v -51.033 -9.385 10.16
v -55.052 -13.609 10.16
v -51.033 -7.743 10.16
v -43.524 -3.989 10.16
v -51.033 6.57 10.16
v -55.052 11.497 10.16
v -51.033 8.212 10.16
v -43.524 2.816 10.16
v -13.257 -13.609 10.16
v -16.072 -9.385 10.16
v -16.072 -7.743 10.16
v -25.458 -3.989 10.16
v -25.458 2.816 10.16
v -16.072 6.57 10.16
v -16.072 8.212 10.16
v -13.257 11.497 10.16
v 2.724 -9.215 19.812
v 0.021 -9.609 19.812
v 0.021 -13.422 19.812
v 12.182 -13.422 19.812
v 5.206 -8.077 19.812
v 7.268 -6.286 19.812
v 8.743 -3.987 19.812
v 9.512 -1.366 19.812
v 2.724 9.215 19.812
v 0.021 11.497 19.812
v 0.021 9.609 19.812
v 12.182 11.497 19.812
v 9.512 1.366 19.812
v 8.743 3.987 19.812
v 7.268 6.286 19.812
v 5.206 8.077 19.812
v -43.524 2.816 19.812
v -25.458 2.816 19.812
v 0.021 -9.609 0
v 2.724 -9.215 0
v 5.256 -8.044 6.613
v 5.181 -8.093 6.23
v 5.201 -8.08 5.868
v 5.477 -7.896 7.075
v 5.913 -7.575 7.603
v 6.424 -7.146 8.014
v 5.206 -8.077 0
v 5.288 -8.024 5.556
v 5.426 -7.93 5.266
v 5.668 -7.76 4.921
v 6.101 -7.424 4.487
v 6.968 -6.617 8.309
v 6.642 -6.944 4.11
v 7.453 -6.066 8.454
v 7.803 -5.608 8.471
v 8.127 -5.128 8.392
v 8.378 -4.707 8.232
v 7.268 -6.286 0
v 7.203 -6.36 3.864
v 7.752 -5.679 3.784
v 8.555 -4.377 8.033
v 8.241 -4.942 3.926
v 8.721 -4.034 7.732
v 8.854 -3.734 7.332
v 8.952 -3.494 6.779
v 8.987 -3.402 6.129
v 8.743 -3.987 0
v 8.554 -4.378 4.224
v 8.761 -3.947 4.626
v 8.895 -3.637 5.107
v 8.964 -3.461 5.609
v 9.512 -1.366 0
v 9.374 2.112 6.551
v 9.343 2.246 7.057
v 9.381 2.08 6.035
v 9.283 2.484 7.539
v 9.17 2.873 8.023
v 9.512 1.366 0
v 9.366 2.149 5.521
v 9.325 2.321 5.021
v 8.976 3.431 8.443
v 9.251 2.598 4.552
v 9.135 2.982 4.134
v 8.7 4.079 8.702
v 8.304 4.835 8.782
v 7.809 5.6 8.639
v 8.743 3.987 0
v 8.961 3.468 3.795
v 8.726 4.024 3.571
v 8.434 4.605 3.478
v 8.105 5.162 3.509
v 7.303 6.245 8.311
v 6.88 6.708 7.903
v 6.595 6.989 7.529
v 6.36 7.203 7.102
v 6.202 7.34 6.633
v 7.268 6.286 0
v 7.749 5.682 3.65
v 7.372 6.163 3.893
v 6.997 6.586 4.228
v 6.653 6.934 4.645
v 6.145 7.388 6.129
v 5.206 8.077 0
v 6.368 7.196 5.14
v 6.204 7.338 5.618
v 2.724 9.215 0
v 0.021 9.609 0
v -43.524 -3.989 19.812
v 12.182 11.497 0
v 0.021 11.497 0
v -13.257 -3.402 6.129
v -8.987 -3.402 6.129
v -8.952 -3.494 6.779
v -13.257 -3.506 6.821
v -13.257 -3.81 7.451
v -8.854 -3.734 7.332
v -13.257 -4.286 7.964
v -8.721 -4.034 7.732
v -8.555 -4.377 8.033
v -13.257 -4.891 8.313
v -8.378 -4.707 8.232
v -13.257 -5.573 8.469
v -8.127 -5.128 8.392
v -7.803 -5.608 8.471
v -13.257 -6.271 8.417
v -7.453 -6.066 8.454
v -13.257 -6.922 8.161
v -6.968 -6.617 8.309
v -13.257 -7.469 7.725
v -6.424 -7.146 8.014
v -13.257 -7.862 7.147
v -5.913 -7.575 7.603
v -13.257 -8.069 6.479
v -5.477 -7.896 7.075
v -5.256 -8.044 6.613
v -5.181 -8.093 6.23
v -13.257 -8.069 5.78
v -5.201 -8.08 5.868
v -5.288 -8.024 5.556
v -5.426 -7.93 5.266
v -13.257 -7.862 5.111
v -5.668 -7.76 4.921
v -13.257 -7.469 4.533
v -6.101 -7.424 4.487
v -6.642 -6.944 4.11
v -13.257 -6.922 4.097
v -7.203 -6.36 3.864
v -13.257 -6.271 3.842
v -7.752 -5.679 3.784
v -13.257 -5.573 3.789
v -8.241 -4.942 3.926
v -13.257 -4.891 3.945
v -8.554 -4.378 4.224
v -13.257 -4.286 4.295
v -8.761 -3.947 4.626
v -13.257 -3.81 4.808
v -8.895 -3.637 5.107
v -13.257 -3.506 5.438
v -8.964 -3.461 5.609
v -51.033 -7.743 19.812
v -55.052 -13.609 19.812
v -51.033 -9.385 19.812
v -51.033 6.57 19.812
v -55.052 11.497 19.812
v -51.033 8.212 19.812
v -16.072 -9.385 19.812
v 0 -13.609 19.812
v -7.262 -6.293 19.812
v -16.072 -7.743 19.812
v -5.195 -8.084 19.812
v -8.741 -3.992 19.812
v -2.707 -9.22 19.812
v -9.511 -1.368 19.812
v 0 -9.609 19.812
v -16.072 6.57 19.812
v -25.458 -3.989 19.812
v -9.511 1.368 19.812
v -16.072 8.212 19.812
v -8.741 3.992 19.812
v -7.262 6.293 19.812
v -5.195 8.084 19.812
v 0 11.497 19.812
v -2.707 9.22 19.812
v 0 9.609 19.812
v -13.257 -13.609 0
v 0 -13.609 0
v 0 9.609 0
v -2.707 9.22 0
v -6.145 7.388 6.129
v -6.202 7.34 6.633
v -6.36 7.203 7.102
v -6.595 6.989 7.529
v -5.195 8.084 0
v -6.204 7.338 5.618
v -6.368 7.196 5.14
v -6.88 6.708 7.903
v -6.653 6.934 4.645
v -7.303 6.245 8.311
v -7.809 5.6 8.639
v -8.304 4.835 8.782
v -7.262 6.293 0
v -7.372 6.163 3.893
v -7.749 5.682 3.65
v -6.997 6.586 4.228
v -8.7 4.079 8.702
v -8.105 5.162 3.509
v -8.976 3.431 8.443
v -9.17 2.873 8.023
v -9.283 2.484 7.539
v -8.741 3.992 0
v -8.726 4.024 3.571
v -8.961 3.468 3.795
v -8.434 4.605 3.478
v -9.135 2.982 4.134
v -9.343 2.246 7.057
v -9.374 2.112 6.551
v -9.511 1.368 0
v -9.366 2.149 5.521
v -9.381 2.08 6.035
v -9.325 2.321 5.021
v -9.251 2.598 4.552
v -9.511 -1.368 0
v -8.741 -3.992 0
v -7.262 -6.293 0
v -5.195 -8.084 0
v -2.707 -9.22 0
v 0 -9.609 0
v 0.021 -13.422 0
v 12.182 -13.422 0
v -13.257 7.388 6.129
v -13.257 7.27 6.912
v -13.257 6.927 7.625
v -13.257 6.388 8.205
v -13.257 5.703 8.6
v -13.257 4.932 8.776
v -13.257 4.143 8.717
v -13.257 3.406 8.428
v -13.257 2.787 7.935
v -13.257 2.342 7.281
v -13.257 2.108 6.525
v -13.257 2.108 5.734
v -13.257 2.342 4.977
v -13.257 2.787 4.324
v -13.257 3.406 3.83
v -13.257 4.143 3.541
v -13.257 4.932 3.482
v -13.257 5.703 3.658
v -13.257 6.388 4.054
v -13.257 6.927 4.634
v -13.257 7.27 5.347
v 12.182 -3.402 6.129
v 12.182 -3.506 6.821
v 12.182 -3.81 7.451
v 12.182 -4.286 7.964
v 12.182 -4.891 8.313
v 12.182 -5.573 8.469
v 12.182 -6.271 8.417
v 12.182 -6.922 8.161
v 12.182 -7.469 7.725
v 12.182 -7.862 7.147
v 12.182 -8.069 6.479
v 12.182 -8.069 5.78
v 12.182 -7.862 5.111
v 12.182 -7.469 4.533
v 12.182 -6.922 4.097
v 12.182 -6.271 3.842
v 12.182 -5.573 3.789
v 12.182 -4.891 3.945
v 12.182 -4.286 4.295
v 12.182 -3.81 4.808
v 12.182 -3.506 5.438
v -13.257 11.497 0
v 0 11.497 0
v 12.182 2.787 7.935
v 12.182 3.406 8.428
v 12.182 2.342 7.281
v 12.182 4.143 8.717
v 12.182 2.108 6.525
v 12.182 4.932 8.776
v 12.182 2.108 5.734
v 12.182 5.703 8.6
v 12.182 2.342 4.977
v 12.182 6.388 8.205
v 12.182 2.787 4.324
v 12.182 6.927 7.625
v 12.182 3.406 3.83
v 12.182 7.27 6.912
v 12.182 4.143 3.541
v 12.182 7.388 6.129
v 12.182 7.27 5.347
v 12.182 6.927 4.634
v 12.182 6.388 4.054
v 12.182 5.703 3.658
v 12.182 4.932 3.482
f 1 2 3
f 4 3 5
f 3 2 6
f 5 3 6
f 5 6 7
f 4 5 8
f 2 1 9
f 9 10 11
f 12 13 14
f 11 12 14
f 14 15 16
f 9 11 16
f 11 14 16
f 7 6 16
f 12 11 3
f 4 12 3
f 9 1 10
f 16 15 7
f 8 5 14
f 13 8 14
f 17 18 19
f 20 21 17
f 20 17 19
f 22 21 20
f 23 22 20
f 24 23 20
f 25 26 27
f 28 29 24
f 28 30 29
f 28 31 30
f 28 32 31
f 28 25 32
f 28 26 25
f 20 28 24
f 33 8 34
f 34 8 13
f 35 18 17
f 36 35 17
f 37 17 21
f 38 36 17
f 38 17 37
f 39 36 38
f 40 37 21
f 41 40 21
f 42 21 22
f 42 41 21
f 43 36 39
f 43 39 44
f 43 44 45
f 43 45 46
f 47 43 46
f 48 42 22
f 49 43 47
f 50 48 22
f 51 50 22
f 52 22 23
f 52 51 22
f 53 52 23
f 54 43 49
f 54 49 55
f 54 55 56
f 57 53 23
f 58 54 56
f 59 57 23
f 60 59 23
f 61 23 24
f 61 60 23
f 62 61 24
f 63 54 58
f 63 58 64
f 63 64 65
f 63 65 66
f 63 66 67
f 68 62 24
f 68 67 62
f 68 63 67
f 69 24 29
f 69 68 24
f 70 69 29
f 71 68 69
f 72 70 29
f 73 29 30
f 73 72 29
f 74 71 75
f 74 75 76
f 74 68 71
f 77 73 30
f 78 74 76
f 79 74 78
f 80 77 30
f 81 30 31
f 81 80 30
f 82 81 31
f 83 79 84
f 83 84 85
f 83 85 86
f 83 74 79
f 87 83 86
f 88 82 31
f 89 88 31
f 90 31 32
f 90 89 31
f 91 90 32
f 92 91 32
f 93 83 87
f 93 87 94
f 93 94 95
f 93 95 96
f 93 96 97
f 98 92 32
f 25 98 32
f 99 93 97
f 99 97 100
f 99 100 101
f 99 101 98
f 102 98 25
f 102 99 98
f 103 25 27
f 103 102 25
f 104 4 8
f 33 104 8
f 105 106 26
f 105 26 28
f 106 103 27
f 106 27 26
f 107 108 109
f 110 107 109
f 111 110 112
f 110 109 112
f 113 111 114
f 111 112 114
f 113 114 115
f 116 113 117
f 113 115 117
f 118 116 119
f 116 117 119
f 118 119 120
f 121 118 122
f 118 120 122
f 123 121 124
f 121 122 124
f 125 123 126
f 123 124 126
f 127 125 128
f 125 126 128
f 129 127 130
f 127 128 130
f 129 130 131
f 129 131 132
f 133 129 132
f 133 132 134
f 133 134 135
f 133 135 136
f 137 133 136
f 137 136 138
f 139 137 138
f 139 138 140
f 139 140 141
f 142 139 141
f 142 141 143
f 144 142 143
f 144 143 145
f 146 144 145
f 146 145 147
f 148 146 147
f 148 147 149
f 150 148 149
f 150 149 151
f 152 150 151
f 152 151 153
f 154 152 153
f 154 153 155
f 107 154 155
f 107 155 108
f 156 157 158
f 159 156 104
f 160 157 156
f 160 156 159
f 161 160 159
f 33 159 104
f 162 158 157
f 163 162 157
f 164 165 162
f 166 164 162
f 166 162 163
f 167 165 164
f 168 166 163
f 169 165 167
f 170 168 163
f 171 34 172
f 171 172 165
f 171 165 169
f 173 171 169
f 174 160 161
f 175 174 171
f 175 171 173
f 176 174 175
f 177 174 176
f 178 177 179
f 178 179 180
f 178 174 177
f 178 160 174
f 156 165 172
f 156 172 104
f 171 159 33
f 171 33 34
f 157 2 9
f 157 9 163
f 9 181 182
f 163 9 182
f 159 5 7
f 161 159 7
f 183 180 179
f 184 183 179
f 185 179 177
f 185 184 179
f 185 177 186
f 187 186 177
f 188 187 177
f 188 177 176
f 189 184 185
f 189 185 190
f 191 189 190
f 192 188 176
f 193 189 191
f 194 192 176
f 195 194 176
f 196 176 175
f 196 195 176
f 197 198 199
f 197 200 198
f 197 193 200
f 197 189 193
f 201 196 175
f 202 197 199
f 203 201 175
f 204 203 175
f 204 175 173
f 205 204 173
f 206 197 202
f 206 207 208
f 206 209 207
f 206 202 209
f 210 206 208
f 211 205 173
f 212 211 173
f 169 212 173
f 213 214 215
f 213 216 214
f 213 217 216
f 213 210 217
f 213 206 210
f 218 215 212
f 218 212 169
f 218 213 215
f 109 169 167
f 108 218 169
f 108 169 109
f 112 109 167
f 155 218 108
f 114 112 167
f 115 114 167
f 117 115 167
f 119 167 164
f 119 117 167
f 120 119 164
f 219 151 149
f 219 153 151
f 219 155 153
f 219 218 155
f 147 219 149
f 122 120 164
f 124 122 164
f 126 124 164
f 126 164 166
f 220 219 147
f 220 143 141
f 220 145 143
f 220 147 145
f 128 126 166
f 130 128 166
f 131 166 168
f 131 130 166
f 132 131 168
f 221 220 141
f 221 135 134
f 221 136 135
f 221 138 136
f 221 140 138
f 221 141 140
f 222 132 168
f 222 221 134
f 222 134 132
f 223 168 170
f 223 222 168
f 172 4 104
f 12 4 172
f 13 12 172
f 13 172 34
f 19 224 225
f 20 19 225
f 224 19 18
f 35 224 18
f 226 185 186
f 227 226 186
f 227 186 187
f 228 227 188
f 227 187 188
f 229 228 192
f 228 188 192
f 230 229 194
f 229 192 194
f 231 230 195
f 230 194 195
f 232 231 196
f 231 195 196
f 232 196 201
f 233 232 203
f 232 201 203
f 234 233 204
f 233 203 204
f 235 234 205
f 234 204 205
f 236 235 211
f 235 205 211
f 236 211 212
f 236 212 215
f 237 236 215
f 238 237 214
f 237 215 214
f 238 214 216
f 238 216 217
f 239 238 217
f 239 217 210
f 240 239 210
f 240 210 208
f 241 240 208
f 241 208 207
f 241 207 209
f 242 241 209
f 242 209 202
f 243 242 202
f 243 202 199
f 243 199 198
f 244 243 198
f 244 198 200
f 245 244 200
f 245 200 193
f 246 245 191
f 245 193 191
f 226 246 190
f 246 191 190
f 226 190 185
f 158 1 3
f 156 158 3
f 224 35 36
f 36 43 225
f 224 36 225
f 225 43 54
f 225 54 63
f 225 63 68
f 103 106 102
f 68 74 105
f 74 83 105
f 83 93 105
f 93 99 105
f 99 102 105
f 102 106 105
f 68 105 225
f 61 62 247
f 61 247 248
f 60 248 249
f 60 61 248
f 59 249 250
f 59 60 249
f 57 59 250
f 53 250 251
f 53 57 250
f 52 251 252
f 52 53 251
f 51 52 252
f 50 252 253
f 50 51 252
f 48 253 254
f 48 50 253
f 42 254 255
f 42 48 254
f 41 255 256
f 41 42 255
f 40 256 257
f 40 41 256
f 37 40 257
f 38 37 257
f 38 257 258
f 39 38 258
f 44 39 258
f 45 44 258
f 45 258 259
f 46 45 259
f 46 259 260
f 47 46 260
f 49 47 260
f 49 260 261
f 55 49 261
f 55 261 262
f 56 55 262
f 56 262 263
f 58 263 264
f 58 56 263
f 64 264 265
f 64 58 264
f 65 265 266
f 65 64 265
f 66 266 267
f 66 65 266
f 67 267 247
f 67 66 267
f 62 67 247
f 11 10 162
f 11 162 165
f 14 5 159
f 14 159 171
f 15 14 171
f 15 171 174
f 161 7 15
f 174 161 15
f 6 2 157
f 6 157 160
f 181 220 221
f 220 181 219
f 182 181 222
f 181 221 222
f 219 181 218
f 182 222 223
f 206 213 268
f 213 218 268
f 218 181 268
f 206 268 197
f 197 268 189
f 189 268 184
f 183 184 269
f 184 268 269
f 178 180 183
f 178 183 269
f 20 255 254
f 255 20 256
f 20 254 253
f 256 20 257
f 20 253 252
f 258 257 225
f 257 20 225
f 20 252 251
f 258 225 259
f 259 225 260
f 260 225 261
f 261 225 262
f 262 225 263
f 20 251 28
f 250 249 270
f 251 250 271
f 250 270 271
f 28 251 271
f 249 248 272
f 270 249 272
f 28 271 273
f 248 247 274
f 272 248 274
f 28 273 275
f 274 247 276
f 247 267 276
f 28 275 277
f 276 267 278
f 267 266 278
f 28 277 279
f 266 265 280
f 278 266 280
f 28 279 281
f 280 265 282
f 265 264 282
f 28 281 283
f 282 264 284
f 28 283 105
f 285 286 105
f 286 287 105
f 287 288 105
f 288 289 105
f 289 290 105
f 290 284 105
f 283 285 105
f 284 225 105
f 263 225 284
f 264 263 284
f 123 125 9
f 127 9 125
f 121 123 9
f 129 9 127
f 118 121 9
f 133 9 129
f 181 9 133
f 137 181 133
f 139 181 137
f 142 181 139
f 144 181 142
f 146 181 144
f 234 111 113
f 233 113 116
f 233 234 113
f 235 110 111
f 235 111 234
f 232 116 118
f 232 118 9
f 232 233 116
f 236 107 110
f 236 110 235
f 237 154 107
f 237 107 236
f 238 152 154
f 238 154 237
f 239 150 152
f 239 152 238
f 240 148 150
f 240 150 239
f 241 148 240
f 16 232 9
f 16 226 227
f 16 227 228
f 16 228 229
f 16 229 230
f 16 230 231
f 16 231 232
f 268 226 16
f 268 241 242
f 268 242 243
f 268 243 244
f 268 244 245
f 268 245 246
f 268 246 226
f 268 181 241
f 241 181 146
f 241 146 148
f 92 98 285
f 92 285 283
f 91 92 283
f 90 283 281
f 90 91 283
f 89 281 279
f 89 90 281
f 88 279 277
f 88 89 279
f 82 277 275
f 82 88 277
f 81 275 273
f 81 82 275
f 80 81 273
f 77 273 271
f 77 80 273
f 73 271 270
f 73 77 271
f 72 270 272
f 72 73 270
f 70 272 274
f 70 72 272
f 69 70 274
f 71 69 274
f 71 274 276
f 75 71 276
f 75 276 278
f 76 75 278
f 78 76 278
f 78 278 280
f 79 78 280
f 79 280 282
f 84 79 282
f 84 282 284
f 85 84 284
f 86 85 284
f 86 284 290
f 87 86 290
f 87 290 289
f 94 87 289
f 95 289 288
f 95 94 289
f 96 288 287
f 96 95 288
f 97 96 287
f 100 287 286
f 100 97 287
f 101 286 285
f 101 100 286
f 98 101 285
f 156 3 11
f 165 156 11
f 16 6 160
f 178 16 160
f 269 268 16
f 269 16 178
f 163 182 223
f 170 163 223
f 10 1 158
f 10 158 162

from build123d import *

# Parameters (mm, degrees)
F0_W      = 55.052046
F0_H      = 25.105778
F0_W_2    = 12.161485
F0_H_2    = 24.918798
F1_DEPTH  = 19.812
F2_R      = 9.609235
F3_DEPTH  = 37.338
F4_W      = 50.915458
F4_H      = 32.379413
F5_DEPTH  = 10.16
F6_R      = 2.654575
F6_R_2    = 2.346336
F7_DEPTH  = 25.4
F8_DEPTH  = 29.21
F9_W      = 34.960383
F9_H      = 1.642434
F9_H_2    = 1.642435
F9_W_2    = 18.066769
F9_H_3    = 6.804369
F10_DEPTH = 47.498


with BuildPart() as f1:
    # F0 (on Top) → F1 (new body)
    with BuildSketch(Plane.XY):
        with Locations((-27.526023, -1.055851)):
            Rectangle(F0_W, F0_H)
        with Locations((6.101649, -0.962361)):
            Rectangle(F0_W_2, F0_H_2)
    extrude(amount=F1_DEPTH)

    # F2 (on Top) → F3 (cut)
    with BuildSketch(Plane.XY):
        Circle(F2_R)
    extrude(amount=F3_DEPTH, mode=Mode.SUBTRACT)

    # F4 (on Top) → F5 (cut)
    with BuildSketch(Plane.XY):
        with Locations((-38.714517, -0.469266)):
            Rectangle(F4_W, F4_H)
    extrude(amount=F5_DEPTH, mode=Mode.SUBTRACT)

    # F6 (on Right) → F7 (cut)
    with BuildSketch(Plane.YZ):
        with Locations((4.733274, 6.129253)):
            Circle(F6_R)
        with Locations((-5.748518, 6.129253)):
            Circle(F6_R_2)
    extrude(amount=-F7_DEPTH, mode=Mode.SUBTRACT)

    # F6 (on Right) → F8 (cut)
    with BuildSketch(Plane.YZ):
        with Locations((4.733274, 6.129253)):
            Circle(F6_R)
        with Locations((-5.748518, 6.129253)):
            Circle(F6_R_2)
    extrude(amount=F8_DEPTH, mode=Mode.SUBTRACT)

    # F9 (on Top) → F10 (cut)
    with BuildSketch(Plane.XY):
        with Locations((-33.552582, -8.564121)):
            Rectangle(F9_W, F9_H)
        with Locations((-33.552582, 7.390954)):
            Rectangle(F9_W, F9_H_2)
        with Locations((-34.491112, -0.586583)):
            Rectangle(F9_W_2, F9_H_3)
    extrude(amount=F10_DEPTH, mode=Mode.SUBTRACT)


solid = f1.part
